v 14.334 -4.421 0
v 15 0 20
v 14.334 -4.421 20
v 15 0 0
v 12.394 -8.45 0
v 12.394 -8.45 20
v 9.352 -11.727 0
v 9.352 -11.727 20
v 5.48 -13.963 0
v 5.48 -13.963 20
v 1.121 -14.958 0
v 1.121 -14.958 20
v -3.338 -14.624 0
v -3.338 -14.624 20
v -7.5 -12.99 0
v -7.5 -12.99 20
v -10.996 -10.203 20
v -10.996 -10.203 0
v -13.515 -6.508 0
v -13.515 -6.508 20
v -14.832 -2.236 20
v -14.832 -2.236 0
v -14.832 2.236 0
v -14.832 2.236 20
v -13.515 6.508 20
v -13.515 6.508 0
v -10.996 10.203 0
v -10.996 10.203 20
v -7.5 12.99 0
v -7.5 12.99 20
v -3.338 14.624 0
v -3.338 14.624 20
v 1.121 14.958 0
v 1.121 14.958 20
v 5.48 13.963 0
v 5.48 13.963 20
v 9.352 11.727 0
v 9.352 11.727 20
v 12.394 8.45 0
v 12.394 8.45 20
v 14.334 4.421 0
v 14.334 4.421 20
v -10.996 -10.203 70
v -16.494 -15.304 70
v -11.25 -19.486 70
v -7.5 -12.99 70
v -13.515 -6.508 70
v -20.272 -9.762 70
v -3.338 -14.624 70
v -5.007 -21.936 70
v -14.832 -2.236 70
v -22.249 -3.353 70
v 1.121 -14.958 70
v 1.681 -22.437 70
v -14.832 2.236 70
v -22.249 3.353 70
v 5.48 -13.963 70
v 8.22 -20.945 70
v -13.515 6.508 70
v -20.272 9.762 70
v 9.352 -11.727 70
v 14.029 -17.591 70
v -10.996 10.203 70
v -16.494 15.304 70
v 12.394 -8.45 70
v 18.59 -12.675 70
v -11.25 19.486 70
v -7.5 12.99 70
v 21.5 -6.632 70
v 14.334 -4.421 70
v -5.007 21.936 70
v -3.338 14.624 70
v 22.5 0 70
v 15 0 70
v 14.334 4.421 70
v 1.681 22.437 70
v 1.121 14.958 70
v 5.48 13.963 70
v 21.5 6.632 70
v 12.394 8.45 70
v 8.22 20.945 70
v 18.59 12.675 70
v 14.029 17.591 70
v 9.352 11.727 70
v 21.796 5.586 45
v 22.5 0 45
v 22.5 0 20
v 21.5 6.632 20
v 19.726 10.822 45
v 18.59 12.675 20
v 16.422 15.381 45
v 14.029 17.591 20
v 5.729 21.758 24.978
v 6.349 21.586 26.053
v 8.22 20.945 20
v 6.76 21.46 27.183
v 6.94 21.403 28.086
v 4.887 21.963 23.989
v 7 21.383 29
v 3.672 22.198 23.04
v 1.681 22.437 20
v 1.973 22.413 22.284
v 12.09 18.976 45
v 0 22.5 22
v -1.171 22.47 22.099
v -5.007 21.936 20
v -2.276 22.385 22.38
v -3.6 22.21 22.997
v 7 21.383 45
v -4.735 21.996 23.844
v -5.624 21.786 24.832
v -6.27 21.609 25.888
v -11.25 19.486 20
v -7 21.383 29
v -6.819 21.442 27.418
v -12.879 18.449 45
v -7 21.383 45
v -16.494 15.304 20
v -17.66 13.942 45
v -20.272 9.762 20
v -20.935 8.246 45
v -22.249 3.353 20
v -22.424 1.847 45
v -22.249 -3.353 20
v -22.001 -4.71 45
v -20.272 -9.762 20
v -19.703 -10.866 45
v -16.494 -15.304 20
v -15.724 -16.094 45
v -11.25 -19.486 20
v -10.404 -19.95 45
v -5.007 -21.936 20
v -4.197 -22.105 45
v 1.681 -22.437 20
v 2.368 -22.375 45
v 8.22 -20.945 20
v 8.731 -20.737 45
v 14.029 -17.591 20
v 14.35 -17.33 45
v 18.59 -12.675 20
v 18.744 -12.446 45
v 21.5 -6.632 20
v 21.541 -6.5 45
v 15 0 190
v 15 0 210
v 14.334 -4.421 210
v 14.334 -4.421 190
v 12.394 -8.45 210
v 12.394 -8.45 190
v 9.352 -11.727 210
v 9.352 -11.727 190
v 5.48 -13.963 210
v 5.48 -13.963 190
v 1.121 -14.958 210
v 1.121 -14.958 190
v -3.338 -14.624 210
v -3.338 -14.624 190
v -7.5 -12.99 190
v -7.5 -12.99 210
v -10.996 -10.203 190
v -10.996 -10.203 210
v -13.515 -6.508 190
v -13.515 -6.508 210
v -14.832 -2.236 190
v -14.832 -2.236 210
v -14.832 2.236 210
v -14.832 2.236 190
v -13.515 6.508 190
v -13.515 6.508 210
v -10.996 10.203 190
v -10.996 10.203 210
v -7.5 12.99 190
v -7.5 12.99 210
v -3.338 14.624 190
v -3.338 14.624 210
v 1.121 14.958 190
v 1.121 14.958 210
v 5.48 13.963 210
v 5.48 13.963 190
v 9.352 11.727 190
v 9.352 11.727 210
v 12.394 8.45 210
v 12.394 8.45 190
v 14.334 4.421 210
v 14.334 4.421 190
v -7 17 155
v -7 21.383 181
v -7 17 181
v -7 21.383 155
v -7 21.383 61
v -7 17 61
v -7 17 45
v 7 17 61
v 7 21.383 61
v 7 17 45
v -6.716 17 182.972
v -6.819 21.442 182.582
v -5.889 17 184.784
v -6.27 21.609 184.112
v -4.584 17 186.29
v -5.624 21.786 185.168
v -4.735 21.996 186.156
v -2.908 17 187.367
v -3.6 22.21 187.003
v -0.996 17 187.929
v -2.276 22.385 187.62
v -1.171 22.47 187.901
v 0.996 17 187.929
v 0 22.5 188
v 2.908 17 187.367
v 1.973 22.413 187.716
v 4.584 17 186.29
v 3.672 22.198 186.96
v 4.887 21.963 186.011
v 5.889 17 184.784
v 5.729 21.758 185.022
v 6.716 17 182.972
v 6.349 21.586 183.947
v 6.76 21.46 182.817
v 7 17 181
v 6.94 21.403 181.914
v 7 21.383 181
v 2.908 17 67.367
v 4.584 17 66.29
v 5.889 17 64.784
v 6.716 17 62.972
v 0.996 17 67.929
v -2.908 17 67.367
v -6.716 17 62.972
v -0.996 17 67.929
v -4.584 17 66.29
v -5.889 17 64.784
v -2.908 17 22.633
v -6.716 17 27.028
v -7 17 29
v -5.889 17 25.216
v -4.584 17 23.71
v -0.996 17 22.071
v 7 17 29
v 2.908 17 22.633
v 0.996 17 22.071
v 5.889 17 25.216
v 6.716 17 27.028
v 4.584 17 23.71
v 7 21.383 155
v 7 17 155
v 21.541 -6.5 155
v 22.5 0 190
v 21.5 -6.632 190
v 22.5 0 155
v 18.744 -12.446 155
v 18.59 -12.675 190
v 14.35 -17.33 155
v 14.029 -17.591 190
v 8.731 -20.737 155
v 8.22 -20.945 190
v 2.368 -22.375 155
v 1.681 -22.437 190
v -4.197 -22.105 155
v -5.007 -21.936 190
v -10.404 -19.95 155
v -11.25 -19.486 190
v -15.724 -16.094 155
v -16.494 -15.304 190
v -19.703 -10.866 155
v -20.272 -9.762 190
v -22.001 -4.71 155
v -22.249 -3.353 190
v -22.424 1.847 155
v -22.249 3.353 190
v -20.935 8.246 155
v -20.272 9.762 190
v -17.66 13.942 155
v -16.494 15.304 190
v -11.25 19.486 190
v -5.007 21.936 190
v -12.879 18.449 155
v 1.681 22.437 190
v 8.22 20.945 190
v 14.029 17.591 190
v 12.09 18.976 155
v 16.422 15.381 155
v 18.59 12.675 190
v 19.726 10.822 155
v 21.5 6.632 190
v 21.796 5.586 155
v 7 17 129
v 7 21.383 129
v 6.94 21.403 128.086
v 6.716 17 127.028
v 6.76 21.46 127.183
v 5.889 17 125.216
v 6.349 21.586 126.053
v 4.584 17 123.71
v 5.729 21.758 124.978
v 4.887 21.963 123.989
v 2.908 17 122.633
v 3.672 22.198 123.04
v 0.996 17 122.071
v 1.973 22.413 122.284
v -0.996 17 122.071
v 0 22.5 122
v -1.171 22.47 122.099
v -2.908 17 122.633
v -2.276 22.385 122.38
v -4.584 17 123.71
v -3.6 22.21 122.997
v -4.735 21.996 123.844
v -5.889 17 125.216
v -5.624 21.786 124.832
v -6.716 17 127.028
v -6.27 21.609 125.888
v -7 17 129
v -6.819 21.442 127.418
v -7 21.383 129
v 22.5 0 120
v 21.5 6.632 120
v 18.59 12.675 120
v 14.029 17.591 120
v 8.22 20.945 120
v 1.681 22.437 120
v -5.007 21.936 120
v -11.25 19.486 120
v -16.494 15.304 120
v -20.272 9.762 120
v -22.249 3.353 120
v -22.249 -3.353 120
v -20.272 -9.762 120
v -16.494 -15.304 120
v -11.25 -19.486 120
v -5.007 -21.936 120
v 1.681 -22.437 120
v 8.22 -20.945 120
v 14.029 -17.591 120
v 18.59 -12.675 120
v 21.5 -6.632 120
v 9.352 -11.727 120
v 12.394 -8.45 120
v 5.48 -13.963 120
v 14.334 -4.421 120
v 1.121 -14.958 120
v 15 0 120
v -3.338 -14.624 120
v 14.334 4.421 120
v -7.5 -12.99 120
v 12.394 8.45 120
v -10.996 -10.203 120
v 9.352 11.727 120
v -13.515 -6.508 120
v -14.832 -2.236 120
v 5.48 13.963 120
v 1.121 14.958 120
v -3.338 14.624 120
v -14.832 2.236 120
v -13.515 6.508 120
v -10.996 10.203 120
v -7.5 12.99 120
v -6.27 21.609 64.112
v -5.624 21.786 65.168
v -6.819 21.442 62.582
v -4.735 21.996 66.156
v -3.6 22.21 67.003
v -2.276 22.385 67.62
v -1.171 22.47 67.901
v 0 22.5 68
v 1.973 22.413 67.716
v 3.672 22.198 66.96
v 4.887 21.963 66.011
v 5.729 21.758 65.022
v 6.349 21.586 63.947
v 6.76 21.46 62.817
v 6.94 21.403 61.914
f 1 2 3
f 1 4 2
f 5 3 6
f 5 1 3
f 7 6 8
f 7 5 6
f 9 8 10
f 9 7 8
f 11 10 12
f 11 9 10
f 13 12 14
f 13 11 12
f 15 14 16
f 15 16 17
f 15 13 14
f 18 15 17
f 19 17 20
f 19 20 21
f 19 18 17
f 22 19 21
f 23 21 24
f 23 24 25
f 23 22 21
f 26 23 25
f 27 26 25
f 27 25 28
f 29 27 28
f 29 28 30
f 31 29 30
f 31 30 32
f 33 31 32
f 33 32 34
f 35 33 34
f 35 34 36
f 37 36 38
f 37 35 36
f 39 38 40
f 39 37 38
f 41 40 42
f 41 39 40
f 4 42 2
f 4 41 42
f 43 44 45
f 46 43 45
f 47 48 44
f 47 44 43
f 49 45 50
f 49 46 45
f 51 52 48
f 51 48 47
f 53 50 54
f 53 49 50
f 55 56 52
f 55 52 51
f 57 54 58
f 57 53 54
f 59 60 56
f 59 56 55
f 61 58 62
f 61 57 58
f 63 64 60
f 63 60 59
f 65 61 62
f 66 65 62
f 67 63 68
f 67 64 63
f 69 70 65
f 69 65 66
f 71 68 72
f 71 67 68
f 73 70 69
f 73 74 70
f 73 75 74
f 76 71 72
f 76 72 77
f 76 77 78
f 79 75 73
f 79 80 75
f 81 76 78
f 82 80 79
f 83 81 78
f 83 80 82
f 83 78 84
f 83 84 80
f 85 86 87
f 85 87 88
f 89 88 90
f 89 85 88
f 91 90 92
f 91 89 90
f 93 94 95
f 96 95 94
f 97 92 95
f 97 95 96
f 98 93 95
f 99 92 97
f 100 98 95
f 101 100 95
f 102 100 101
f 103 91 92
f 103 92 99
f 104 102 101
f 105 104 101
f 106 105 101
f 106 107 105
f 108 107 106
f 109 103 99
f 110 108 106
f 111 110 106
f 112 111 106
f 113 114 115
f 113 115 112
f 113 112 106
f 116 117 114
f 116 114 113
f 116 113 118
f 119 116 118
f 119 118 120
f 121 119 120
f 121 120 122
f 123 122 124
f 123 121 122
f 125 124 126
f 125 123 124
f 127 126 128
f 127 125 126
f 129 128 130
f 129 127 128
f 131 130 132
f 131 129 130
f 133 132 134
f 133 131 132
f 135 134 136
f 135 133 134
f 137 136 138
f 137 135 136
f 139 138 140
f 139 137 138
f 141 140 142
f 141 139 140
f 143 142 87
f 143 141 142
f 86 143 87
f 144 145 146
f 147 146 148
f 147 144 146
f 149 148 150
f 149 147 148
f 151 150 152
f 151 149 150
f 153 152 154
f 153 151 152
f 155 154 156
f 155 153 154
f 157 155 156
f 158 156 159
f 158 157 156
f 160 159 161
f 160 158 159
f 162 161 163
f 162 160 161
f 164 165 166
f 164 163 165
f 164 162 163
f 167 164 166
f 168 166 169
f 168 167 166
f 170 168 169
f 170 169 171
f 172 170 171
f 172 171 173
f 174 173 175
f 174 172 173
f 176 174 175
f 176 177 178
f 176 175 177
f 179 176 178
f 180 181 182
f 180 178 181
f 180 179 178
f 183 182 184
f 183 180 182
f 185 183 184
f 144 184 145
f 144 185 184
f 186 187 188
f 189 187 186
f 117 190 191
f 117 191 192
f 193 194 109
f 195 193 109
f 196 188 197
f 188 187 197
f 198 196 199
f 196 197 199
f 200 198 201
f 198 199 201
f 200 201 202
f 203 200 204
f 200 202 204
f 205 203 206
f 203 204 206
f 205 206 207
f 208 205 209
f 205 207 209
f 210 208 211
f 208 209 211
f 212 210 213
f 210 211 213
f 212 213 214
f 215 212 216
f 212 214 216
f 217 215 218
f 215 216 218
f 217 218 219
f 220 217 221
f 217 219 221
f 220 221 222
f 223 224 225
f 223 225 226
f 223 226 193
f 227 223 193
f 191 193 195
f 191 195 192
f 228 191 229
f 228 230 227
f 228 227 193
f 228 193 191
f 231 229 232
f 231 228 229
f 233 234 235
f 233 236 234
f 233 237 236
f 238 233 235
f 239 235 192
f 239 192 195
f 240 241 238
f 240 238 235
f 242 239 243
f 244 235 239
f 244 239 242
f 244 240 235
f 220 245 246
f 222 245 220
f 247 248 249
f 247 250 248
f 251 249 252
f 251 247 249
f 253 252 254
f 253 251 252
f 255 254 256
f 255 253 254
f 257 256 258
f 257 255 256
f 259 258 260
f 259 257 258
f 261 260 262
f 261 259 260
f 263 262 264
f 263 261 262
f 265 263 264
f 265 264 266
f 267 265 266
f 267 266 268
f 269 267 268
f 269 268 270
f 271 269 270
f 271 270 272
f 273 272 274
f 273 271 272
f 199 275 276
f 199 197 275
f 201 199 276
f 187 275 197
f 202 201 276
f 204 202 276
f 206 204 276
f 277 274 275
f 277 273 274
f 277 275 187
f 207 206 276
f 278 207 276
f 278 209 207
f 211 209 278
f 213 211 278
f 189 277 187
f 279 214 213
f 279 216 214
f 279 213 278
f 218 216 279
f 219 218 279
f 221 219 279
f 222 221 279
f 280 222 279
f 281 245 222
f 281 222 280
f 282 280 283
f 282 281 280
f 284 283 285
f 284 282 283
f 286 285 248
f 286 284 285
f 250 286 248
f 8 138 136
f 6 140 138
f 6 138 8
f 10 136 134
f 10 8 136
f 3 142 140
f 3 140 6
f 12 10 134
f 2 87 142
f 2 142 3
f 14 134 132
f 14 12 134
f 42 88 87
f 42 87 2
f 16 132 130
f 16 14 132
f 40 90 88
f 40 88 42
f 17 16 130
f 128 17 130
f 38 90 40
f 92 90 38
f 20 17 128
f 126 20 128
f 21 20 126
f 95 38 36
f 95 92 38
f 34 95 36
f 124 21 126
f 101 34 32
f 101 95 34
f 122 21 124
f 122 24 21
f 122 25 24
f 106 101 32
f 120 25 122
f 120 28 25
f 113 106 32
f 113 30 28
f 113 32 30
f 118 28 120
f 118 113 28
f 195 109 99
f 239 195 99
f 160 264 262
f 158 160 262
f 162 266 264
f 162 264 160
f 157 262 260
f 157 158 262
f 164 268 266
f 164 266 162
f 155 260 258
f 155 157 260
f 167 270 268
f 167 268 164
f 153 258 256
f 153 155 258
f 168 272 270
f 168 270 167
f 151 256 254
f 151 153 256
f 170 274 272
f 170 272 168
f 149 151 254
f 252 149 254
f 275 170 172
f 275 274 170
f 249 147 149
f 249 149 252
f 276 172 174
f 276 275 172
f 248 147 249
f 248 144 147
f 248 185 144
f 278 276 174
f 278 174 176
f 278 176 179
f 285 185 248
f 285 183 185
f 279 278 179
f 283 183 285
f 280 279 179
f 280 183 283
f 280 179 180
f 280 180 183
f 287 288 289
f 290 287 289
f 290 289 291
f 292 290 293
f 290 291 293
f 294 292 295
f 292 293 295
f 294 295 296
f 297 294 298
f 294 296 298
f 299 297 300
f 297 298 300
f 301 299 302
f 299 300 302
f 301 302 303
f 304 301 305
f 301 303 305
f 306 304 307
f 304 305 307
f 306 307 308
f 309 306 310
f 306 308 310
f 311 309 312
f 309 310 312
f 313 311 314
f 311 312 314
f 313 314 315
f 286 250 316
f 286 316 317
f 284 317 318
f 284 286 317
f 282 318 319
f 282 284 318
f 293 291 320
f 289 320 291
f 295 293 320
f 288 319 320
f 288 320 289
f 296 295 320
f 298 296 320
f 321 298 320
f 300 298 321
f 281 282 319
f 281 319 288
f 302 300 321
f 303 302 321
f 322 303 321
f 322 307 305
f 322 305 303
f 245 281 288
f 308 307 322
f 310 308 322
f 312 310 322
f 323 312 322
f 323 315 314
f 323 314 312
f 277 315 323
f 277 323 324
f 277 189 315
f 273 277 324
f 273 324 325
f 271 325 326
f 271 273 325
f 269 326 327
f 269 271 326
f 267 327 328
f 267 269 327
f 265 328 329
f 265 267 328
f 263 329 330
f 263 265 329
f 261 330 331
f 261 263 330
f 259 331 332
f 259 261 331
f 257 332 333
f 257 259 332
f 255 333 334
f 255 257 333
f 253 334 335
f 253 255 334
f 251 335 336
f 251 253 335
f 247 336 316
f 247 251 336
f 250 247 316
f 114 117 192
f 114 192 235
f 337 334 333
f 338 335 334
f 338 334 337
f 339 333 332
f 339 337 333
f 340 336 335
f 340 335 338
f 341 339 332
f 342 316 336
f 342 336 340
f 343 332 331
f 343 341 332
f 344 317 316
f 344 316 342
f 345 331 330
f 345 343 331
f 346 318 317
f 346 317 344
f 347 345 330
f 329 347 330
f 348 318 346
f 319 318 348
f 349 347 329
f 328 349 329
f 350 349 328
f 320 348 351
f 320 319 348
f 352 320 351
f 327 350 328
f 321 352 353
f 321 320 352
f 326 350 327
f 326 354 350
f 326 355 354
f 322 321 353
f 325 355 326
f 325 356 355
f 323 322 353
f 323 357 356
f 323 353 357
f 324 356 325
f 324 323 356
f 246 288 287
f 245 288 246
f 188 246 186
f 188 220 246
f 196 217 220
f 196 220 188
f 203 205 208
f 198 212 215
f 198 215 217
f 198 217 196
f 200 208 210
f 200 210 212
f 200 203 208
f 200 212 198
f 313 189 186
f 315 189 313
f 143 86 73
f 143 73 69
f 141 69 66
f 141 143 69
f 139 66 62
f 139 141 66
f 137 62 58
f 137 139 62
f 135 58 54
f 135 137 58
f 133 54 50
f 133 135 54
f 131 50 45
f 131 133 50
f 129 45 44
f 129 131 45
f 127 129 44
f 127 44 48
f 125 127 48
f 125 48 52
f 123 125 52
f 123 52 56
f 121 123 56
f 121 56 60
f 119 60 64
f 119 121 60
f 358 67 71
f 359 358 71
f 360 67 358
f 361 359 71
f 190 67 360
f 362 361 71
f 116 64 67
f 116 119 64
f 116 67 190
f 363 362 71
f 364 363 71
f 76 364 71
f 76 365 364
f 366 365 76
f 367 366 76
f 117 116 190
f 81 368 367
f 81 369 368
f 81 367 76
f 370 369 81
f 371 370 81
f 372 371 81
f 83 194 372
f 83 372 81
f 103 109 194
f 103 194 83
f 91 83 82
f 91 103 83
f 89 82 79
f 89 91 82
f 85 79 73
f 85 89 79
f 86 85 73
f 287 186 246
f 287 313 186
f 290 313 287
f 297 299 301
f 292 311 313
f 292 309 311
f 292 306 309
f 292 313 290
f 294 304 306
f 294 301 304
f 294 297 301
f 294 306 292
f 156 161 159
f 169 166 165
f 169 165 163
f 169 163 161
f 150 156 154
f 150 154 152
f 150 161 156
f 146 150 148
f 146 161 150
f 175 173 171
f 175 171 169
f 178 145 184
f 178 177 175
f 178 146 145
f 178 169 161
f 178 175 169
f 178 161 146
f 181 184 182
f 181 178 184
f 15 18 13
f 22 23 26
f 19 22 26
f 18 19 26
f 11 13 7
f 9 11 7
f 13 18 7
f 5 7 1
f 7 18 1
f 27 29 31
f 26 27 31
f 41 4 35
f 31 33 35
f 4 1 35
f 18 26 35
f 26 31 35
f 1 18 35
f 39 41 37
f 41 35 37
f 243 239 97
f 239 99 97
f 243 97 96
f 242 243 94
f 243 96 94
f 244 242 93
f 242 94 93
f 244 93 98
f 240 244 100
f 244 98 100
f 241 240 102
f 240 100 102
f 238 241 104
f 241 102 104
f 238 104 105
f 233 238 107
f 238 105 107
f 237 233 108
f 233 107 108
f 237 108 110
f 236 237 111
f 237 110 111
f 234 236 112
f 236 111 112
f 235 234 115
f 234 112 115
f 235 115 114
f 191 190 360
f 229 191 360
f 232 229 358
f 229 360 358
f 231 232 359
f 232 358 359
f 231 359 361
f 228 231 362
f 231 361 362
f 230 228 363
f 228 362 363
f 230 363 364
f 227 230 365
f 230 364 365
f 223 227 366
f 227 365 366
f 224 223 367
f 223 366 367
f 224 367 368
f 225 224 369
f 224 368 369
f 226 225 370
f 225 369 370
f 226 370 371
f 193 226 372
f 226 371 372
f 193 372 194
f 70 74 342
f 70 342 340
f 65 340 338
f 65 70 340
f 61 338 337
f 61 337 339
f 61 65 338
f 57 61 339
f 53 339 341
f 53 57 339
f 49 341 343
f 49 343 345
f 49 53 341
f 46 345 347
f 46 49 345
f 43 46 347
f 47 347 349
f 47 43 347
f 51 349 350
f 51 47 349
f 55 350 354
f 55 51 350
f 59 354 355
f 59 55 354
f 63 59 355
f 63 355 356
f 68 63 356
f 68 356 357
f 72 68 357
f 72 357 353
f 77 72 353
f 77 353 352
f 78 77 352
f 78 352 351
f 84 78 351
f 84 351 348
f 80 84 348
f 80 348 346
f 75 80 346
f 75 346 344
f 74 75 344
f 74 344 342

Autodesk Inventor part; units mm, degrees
sketch "スケッチ1" plane through (0, 0, 0) normal (0, 0, 1) x (1, 0, 0)
  point P0 (0, 0)
ref_plane "作業平面1" through (0, 0, 45) normal (0, 0, 1) x (1, 0, 0)
ref_plane "作業平面2" through (0, 0, 155) normal (0, 0, 1) x (1, 0, 0)
ref_plane "作業平面3" through (0, 0, 210) normal (0, 0, 1) x (1, 0, 0)
sketch "スケッチ2" plane through (0, 0, 45) normal (0, 0, 1) x (1, 0, 0)
  circle A0 centre (0, 0) radius 22.5
  dimension "d3" = 45
extrude "押し出し1" add sketch "スケッチ2" along normal blind 25
sketch "スケッチ3" plane through (0, 0, 155) normal (0, 0, 1) x (1, 0, 0)
  circle A0 centre (0, 0) radius 22.5
  dimension "d6" = 45
extrude "押し出し2" add sketch "スケッチ3" along normal blind 35
ref_plane "作業平面5" through (0, 22.5, 0) normal (0, 1, 0) x (-1, 0, 0)
sketch "スケッチ5" plane through (0, 22.5, 0) normal (0, 1, 0) x (-1, 0, 0)
  line L0 (22.5, 45) -> (-22.5, 45) projected
  line L1 (0, 45) -> (0, 65)
  line L2 (0, 65) -> (0, 61)
  arc A0 (7, 61) -> (-7, 61) centre (0, 61) ccw
  line L3 (7, 61) -> (7, 45)
  line L4 (7, 45) -> (-7, 45)
  line L5 (-7, 61) -> (-7, 45)
  line L6 (7, 45) -> (-7, 45)
  point P0 (0, 0)
  point P1 (-4, 61)
  dimension "d11" = 20
  dimension "d12" = 4
  dimension "d13" = 7
extrude "押し出し3" cut sketch "スケッチ5" against normal blind 5.5
mirror "ミラー1" about plane through (0, 0, 45) normal (0, 0, 1) of "押し出し1", "押し出し3"
sketch "スケッチ6" plane through (0, 22.5, 0) normal (0, 1, 0) x (-1, 0, 0)
  line L0 (22.5, 155) -> (-22.5, 155) projected
  line L1 (0, 155) -> (0, 185)
  line L2 (0, 185) -> (0, 181)
  arc A0 (7, 181) -> (-7, 181) centre (0, 181) ccw
  line L3 (7, 181) -> (7, 155)
  line L4 (-7, 155) -> (-7, 181)
  line L5 (7, 155) -> (-7, 155)
  point P0 (0, 0)
  dimension "d16" = 30
  dimension "d17" = 4
  dimension "d18" = 7
extrude "押し出し4" cut sketch "スケッチ6" against normal blind 5.5
mirror "ミラー2" about plane through (0, 0, 155) normal (0, 0, -1) of "押し出し4", "押し出し2"
sketch "スケッチ7" plane through (0, 0, 0) normal (0, 0, 1) x (1, 0, 0)
  circle A0 centre (0, 0) radius 15
  dimension "d21" = 30
extrude "押し出し5" add sketch "スケッチ7" along normal blind 210
properties part number "shift2"
